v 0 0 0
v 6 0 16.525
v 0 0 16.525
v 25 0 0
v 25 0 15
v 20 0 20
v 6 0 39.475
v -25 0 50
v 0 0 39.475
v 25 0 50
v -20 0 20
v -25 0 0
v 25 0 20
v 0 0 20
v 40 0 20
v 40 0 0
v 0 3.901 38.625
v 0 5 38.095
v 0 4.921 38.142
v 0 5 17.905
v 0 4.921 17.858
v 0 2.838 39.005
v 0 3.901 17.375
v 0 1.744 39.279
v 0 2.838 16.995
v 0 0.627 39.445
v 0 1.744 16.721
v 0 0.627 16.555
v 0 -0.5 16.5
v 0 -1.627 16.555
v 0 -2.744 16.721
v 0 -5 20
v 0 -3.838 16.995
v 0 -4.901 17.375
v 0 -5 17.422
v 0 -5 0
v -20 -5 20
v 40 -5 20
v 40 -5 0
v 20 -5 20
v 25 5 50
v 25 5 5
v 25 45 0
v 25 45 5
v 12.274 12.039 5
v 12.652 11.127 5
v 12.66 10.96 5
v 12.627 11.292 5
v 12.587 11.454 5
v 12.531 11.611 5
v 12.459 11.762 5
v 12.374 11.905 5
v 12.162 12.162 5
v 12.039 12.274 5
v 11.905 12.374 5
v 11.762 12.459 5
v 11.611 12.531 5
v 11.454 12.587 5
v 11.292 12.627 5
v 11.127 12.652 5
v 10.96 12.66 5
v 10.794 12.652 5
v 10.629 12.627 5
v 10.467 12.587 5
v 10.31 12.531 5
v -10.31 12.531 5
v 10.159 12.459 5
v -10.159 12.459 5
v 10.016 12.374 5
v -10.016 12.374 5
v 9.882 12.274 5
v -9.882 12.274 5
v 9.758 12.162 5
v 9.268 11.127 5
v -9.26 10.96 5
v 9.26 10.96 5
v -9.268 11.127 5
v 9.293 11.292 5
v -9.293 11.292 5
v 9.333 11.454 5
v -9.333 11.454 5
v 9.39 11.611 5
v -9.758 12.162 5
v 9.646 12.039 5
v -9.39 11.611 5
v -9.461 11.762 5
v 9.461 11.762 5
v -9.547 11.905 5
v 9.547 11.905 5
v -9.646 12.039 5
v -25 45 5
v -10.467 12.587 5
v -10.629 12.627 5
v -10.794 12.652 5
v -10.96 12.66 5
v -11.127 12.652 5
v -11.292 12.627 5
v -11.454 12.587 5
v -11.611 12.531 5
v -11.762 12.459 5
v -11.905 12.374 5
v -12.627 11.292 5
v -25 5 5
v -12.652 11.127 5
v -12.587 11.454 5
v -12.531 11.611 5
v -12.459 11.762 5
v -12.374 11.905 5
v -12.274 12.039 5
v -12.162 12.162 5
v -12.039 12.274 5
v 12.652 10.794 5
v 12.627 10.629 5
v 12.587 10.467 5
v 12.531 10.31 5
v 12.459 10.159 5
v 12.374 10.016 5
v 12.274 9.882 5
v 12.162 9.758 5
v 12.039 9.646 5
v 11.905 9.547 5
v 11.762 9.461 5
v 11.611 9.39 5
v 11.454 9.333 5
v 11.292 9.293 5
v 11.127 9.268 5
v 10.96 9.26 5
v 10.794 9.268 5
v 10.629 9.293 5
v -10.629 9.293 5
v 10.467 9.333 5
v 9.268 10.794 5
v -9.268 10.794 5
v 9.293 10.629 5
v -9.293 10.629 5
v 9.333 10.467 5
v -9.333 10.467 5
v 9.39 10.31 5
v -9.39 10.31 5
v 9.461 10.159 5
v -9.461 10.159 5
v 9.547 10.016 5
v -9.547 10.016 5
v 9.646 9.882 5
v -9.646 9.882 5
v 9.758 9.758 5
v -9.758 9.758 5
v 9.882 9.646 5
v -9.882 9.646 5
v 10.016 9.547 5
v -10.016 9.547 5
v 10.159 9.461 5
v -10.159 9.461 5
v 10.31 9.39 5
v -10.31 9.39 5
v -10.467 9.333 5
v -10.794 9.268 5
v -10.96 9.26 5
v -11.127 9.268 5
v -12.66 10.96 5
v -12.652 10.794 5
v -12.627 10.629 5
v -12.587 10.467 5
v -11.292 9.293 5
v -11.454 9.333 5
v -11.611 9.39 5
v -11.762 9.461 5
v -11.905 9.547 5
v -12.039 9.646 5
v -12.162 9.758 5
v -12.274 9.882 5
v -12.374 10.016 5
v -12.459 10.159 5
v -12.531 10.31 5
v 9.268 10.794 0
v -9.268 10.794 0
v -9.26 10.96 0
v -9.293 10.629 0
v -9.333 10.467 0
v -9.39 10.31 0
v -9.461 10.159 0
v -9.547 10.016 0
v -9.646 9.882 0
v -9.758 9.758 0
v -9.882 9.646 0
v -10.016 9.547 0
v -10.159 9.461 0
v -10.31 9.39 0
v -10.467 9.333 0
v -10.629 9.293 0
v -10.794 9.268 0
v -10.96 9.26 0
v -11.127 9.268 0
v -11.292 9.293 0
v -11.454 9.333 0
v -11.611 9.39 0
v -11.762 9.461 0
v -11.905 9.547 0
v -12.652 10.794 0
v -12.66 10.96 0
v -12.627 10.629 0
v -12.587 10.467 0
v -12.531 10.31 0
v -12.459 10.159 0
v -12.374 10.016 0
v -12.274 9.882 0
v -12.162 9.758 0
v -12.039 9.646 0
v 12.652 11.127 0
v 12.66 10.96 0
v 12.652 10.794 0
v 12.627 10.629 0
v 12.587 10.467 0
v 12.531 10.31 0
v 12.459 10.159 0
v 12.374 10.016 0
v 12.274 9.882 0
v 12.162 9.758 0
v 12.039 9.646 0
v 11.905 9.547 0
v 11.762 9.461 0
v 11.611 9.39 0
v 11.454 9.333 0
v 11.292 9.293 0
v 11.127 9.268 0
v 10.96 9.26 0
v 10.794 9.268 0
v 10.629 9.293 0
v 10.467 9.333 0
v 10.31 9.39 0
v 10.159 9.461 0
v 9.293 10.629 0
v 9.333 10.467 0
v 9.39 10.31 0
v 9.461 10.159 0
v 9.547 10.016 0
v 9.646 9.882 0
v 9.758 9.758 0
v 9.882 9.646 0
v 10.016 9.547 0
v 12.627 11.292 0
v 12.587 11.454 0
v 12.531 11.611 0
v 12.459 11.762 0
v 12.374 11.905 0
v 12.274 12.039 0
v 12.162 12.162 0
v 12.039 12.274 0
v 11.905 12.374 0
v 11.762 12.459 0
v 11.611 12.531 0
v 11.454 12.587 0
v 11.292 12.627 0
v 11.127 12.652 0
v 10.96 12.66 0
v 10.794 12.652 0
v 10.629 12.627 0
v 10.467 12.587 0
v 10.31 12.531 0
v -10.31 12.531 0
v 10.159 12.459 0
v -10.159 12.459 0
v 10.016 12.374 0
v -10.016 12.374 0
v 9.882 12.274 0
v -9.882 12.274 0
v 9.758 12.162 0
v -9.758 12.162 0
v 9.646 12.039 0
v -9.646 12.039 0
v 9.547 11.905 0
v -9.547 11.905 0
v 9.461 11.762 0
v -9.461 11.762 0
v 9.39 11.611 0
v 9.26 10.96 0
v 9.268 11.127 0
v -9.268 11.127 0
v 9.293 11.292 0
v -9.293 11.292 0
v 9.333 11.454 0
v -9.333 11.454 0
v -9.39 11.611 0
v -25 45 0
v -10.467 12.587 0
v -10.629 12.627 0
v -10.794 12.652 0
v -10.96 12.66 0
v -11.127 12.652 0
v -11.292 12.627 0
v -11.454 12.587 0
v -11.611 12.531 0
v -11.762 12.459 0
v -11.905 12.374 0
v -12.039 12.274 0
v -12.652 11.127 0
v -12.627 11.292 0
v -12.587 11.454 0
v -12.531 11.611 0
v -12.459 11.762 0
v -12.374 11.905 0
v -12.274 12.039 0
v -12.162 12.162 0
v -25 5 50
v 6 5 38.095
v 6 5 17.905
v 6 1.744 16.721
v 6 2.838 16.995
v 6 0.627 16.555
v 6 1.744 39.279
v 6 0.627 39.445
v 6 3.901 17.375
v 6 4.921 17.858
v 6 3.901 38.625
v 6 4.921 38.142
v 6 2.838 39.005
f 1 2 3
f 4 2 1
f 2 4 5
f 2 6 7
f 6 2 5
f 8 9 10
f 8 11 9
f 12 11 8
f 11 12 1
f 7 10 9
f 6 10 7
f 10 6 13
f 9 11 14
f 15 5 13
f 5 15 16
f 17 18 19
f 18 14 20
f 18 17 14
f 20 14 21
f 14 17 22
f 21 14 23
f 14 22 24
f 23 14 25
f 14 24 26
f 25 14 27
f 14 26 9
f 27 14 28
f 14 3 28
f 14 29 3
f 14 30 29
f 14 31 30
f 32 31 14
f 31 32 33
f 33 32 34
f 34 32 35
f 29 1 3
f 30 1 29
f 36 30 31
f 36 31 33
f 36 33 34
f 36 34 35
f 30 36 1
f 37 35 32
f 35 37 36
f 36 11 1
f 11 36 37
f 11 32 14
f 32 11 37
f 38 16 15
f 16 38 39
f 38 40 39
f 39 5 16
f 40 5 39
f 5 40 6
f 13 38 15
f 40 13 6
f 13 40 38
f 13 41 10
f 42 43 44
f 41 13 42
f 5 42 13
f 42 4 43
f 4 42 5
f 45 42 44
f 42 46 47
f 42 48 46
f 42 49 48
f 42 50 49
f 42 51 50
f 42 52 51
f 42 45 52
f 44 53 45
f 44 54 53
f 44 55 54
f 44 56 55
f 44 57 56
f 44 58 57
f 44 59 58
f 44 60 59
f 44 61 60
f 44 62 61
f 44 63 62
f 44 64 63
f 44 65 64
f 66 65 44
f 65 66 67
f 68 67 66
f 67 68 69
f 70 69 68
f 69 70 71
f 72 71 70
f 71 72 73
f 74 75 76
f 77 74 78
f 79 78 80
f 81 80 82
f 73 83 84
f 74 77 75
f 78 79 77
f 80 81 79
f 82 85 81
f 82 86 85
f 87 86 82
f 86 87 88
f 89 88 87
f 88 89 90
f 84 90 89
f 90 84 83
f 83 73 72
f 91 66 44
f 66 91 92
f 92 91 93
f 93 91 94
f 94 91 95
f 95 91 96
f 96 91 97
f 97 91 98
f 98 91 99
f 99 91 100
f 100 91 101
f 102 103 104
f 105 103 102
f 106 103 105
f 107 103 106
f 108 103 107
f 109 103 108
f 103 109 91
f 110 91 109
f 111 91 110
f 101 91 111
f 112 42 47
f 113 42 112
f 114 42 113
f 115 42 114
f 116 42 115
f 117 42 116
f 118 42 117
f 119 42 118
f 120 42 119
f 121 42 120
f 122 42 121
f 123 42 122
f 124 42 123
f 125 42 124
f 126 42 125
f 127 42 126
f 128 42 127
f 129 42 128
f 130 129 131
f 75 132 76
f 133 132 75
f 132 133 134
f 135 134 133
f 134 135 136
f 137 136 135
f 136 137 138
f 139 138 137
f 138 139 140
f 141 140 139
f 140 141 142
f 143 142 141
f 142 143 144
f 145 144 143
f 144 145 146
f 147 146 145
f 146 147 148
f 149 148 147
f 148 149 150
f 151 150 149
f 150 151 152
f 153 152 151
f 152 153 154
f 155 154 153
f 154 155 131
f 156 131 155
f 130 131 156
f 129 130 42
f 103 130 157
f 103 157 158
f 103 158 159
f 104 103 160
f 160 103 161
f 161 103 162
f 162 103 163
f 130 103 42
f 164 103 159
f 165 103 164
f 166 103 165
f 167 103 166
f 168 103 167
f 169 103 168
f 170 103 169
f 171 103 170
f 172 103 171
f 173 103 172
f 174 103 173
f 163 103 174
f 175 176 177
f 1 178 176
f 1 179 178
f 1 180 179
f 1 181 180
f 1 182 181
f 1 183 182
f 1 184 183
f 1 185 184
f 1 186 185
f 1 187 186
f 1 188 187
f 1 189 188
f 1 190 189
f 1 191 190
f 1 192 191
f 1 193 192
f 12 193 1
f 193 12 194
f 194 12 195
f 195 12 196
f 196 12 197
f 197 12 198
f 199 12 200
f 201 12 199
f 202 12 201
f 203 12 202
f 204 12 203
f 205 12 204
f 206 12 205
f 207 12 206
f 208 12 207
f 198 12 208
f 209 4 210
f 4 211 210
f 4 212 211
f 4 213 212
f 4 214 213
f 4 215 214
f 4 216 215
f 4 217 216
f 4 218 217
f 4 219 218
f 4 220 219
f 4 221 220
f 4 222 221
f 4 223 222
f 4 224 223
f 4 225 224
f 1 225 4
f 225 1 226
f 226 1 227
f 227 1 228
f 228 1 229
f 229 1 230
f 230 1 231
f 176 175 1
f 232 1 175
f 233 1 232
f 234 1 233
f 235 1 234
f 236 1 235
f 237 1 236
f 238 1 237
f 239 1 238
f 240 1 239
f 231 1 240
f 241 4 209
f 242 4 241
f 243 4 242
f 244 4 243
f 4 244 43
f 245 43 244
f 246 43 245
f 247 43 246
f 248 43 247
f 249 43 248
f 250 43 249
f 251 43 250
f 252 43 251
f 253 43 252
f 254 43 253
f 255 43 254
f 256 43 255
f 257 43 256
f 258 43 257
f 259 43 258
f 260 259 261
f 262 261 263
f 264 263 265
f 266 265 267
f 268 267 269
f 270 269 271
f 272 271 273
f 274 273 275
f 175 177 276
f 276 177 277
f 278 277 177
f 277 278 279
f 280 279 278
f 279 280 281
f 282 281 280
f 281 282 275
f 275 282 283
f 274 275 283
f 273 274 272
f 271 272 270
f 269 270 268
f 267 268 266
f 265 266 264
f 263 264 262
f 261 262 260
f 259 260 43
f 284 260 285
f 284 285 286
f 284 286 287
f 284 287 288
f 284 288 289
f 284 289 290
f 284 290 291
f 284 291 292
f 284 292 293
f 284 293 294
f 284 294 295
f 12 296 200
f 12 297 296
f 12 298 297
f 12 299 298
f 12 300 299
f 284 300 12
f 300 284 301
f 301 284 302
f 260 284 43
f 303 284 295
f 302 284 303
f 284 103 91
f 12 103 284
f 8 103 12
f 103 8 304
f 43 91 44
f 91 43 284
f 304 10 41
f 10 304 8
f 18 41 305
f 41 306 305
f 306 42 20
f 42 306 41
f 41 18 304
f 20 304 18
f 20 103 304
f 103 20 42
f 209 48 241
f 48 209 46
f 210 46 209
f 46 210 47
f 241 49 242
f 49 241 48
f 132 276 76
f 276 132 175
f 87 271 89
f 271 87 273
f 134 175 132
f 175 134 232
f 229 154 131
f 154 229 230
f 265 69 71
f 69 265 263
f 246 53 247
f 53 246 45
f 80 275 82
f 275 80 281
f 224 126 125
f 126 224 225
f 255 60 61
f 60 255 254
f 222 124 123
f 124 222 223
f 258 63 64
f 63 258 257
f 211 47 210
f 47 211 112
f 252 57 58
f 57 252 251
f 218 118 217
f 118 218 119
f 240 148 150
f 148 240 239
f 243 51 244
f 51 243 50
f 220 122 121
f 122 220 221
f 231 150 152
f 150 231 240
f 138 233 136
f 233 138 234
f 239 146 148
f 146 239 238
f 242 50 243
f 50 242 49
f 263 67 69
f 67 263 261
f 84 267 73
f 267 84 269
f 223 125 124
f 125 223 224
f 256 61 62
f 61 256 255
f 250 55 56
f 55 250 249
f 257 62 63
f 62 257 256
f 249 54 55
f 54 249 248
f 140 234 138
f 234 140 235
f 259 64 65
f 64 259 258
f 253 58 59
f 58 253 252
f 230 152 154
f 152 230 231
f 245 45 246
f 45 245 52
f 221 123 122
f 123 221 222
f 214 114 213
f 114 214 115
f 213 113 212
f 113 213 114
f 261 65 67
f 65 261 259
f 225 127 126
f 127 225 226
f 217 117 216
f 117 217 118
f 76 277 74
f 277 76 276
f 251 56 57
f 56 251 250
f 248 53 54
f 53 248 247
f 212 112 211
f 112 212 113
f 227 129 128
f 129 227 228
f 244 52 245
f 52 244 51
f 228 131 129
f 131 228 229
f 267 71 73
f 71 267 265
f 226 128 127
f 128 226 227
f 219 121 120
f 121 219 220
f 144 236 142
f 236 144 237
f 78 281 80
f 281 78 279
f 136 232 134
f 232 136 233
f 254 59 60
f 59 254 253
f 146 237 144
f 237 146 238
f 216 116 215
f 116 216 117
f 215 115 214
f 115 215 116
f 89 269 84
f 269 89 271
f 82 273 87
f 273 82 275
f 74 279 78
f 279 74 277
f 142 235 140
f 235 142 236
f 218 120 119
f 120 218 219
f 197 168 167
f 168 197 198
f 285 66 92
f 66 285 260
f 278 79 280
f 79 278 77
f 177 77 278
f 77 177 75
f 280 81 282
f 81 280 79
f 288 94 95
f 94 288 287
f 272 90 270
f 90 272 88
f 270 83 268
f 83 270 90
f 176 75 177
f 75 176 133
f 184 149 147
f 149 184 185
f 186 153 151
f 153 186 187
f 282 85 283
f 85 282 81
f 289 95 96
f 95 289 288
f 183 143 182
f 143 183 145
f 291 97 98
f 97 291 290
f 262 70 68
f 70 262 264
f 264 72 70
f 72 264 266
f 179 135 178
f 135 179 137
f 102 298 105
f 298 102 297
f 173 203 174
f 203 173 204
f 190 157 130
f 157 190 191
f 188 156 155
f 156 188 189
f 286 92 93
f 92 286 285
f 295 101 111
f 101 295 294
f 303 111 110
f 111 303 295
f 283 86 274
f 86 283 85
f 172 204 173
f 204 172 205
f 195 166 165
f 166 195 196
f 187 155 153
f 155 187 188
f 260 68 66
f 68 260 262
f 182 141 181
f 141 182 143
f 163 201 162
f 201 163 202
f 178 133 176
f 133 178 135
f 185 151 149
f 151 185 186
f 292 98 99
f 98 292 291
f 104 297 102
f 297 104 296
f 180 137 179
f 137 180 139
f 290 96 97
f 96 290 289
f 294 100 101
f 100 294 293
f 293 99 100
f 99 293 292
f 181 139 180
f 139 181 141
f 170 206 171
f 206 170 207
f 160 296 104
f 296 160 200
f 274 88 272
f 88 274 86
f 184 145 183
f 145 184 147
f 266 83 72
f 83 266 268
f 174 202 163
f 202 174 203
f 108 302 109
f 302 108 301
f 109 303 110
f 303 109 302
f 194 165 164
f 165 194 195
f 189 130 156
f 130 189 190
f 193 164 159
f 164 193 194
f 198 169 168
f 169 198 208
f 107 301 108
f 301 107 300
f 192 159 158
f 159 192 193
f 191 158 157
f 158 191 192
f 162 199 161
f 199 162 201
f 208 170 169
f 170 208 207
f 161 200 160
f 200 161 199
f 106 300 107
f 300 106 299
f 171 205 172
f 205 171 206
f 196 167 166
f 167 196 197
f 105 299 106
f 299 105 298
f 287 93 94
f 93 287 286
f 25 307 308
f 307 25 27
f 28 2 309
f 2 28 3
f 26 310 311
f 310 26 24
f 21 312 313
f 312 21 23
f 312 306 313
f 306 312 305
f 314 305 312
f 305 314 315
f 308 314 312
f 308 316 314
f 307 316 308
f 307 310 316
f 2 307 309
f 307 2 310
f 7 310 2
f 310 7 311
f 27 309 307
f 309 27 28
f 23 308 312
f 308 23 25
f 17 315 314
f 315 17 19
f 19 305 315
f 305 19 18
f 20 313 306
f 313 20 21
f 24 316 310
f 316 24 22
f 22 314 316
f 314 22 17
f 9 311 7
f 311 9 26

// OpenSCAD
// L-shaped mounting bracket for NEMA 17 stepper motor
// Print orientation: base plate flat on bed, motor plate vertical

$fn = 64;

// ---- Base plate ----
base_x = 25;    // plate extends from -x to +x
base_y = 45;    // plate extends from y = 0 to y = base_y
base_t = 5;     // plate thickness (z = 0 to 5)

// ---- Motor plate ----
motor_h = 50;   // plate height (z = 0 to 50)
motor_w = 5;    // plate thickness (y = 0 to 5)

// ---- Boss hole ----
boss_d  = 23;   // hole diameter
boss_x  = 0;    // hole centre X
boss_z  = 28;   // hole centre Z

// ---- Screw holes ----
screw_d = 3.4;  // hole diameter
screw_n = 4;    // number of holes
screw_s = 31;   // square pattern size (corner to corner)

// ---- Gussets ----
gusset_t = 5;   // gusset thickness (X direction)
gusset_l = 20;  // gusset leg lengths (Y and Z)

// ---- Misc ----
eps = 0.5;      // overshoot for clean cuts

difference() {
    union() {
        // Base plate
        translate([-base_x, 0, 0])
            cube([2 * base_x, base_y, base_t]);

        // Motor plate (overlaps base plate for a solid union)
        translate([-base_x, 0, 0])
            cube([2 * base_x, motor_w, motor_h]);

        // Gussets: right-triangle profile in YZ, extruded along X
        // flush with the outer edges at x = -base_x and x = +base_x
        for (sx = [-1, 1])
            translate([sx * (base_x - gusset_t), 0, 0])
                rotate([90, 0, 0])
                    linear_extrude(height = gusset_t)
                        polygon(points = [
                            [gusset_l, gusset_l],
                            [gusset_l, 0],
                            [0, gusset_l]
                        ]);
    }

    // Boss hole (through along Y)
    translate([boss_x, -eps, boss_z])
        rotate([0, 90, 0])
            cylinder(d = boss_d, h = motor_w + 2 * eps);

    // Screw holes on a square pattern centred on the boss hole
    for (i = [0 : screw_n - 1]) {
        a = 45 + i * 90;
        r = screw_s / 2;
        translate([r * cos(a), r * sin(a), 0])
            cylinder(d = screw_d, h = motor_h + 2 * eps);
    }
}
